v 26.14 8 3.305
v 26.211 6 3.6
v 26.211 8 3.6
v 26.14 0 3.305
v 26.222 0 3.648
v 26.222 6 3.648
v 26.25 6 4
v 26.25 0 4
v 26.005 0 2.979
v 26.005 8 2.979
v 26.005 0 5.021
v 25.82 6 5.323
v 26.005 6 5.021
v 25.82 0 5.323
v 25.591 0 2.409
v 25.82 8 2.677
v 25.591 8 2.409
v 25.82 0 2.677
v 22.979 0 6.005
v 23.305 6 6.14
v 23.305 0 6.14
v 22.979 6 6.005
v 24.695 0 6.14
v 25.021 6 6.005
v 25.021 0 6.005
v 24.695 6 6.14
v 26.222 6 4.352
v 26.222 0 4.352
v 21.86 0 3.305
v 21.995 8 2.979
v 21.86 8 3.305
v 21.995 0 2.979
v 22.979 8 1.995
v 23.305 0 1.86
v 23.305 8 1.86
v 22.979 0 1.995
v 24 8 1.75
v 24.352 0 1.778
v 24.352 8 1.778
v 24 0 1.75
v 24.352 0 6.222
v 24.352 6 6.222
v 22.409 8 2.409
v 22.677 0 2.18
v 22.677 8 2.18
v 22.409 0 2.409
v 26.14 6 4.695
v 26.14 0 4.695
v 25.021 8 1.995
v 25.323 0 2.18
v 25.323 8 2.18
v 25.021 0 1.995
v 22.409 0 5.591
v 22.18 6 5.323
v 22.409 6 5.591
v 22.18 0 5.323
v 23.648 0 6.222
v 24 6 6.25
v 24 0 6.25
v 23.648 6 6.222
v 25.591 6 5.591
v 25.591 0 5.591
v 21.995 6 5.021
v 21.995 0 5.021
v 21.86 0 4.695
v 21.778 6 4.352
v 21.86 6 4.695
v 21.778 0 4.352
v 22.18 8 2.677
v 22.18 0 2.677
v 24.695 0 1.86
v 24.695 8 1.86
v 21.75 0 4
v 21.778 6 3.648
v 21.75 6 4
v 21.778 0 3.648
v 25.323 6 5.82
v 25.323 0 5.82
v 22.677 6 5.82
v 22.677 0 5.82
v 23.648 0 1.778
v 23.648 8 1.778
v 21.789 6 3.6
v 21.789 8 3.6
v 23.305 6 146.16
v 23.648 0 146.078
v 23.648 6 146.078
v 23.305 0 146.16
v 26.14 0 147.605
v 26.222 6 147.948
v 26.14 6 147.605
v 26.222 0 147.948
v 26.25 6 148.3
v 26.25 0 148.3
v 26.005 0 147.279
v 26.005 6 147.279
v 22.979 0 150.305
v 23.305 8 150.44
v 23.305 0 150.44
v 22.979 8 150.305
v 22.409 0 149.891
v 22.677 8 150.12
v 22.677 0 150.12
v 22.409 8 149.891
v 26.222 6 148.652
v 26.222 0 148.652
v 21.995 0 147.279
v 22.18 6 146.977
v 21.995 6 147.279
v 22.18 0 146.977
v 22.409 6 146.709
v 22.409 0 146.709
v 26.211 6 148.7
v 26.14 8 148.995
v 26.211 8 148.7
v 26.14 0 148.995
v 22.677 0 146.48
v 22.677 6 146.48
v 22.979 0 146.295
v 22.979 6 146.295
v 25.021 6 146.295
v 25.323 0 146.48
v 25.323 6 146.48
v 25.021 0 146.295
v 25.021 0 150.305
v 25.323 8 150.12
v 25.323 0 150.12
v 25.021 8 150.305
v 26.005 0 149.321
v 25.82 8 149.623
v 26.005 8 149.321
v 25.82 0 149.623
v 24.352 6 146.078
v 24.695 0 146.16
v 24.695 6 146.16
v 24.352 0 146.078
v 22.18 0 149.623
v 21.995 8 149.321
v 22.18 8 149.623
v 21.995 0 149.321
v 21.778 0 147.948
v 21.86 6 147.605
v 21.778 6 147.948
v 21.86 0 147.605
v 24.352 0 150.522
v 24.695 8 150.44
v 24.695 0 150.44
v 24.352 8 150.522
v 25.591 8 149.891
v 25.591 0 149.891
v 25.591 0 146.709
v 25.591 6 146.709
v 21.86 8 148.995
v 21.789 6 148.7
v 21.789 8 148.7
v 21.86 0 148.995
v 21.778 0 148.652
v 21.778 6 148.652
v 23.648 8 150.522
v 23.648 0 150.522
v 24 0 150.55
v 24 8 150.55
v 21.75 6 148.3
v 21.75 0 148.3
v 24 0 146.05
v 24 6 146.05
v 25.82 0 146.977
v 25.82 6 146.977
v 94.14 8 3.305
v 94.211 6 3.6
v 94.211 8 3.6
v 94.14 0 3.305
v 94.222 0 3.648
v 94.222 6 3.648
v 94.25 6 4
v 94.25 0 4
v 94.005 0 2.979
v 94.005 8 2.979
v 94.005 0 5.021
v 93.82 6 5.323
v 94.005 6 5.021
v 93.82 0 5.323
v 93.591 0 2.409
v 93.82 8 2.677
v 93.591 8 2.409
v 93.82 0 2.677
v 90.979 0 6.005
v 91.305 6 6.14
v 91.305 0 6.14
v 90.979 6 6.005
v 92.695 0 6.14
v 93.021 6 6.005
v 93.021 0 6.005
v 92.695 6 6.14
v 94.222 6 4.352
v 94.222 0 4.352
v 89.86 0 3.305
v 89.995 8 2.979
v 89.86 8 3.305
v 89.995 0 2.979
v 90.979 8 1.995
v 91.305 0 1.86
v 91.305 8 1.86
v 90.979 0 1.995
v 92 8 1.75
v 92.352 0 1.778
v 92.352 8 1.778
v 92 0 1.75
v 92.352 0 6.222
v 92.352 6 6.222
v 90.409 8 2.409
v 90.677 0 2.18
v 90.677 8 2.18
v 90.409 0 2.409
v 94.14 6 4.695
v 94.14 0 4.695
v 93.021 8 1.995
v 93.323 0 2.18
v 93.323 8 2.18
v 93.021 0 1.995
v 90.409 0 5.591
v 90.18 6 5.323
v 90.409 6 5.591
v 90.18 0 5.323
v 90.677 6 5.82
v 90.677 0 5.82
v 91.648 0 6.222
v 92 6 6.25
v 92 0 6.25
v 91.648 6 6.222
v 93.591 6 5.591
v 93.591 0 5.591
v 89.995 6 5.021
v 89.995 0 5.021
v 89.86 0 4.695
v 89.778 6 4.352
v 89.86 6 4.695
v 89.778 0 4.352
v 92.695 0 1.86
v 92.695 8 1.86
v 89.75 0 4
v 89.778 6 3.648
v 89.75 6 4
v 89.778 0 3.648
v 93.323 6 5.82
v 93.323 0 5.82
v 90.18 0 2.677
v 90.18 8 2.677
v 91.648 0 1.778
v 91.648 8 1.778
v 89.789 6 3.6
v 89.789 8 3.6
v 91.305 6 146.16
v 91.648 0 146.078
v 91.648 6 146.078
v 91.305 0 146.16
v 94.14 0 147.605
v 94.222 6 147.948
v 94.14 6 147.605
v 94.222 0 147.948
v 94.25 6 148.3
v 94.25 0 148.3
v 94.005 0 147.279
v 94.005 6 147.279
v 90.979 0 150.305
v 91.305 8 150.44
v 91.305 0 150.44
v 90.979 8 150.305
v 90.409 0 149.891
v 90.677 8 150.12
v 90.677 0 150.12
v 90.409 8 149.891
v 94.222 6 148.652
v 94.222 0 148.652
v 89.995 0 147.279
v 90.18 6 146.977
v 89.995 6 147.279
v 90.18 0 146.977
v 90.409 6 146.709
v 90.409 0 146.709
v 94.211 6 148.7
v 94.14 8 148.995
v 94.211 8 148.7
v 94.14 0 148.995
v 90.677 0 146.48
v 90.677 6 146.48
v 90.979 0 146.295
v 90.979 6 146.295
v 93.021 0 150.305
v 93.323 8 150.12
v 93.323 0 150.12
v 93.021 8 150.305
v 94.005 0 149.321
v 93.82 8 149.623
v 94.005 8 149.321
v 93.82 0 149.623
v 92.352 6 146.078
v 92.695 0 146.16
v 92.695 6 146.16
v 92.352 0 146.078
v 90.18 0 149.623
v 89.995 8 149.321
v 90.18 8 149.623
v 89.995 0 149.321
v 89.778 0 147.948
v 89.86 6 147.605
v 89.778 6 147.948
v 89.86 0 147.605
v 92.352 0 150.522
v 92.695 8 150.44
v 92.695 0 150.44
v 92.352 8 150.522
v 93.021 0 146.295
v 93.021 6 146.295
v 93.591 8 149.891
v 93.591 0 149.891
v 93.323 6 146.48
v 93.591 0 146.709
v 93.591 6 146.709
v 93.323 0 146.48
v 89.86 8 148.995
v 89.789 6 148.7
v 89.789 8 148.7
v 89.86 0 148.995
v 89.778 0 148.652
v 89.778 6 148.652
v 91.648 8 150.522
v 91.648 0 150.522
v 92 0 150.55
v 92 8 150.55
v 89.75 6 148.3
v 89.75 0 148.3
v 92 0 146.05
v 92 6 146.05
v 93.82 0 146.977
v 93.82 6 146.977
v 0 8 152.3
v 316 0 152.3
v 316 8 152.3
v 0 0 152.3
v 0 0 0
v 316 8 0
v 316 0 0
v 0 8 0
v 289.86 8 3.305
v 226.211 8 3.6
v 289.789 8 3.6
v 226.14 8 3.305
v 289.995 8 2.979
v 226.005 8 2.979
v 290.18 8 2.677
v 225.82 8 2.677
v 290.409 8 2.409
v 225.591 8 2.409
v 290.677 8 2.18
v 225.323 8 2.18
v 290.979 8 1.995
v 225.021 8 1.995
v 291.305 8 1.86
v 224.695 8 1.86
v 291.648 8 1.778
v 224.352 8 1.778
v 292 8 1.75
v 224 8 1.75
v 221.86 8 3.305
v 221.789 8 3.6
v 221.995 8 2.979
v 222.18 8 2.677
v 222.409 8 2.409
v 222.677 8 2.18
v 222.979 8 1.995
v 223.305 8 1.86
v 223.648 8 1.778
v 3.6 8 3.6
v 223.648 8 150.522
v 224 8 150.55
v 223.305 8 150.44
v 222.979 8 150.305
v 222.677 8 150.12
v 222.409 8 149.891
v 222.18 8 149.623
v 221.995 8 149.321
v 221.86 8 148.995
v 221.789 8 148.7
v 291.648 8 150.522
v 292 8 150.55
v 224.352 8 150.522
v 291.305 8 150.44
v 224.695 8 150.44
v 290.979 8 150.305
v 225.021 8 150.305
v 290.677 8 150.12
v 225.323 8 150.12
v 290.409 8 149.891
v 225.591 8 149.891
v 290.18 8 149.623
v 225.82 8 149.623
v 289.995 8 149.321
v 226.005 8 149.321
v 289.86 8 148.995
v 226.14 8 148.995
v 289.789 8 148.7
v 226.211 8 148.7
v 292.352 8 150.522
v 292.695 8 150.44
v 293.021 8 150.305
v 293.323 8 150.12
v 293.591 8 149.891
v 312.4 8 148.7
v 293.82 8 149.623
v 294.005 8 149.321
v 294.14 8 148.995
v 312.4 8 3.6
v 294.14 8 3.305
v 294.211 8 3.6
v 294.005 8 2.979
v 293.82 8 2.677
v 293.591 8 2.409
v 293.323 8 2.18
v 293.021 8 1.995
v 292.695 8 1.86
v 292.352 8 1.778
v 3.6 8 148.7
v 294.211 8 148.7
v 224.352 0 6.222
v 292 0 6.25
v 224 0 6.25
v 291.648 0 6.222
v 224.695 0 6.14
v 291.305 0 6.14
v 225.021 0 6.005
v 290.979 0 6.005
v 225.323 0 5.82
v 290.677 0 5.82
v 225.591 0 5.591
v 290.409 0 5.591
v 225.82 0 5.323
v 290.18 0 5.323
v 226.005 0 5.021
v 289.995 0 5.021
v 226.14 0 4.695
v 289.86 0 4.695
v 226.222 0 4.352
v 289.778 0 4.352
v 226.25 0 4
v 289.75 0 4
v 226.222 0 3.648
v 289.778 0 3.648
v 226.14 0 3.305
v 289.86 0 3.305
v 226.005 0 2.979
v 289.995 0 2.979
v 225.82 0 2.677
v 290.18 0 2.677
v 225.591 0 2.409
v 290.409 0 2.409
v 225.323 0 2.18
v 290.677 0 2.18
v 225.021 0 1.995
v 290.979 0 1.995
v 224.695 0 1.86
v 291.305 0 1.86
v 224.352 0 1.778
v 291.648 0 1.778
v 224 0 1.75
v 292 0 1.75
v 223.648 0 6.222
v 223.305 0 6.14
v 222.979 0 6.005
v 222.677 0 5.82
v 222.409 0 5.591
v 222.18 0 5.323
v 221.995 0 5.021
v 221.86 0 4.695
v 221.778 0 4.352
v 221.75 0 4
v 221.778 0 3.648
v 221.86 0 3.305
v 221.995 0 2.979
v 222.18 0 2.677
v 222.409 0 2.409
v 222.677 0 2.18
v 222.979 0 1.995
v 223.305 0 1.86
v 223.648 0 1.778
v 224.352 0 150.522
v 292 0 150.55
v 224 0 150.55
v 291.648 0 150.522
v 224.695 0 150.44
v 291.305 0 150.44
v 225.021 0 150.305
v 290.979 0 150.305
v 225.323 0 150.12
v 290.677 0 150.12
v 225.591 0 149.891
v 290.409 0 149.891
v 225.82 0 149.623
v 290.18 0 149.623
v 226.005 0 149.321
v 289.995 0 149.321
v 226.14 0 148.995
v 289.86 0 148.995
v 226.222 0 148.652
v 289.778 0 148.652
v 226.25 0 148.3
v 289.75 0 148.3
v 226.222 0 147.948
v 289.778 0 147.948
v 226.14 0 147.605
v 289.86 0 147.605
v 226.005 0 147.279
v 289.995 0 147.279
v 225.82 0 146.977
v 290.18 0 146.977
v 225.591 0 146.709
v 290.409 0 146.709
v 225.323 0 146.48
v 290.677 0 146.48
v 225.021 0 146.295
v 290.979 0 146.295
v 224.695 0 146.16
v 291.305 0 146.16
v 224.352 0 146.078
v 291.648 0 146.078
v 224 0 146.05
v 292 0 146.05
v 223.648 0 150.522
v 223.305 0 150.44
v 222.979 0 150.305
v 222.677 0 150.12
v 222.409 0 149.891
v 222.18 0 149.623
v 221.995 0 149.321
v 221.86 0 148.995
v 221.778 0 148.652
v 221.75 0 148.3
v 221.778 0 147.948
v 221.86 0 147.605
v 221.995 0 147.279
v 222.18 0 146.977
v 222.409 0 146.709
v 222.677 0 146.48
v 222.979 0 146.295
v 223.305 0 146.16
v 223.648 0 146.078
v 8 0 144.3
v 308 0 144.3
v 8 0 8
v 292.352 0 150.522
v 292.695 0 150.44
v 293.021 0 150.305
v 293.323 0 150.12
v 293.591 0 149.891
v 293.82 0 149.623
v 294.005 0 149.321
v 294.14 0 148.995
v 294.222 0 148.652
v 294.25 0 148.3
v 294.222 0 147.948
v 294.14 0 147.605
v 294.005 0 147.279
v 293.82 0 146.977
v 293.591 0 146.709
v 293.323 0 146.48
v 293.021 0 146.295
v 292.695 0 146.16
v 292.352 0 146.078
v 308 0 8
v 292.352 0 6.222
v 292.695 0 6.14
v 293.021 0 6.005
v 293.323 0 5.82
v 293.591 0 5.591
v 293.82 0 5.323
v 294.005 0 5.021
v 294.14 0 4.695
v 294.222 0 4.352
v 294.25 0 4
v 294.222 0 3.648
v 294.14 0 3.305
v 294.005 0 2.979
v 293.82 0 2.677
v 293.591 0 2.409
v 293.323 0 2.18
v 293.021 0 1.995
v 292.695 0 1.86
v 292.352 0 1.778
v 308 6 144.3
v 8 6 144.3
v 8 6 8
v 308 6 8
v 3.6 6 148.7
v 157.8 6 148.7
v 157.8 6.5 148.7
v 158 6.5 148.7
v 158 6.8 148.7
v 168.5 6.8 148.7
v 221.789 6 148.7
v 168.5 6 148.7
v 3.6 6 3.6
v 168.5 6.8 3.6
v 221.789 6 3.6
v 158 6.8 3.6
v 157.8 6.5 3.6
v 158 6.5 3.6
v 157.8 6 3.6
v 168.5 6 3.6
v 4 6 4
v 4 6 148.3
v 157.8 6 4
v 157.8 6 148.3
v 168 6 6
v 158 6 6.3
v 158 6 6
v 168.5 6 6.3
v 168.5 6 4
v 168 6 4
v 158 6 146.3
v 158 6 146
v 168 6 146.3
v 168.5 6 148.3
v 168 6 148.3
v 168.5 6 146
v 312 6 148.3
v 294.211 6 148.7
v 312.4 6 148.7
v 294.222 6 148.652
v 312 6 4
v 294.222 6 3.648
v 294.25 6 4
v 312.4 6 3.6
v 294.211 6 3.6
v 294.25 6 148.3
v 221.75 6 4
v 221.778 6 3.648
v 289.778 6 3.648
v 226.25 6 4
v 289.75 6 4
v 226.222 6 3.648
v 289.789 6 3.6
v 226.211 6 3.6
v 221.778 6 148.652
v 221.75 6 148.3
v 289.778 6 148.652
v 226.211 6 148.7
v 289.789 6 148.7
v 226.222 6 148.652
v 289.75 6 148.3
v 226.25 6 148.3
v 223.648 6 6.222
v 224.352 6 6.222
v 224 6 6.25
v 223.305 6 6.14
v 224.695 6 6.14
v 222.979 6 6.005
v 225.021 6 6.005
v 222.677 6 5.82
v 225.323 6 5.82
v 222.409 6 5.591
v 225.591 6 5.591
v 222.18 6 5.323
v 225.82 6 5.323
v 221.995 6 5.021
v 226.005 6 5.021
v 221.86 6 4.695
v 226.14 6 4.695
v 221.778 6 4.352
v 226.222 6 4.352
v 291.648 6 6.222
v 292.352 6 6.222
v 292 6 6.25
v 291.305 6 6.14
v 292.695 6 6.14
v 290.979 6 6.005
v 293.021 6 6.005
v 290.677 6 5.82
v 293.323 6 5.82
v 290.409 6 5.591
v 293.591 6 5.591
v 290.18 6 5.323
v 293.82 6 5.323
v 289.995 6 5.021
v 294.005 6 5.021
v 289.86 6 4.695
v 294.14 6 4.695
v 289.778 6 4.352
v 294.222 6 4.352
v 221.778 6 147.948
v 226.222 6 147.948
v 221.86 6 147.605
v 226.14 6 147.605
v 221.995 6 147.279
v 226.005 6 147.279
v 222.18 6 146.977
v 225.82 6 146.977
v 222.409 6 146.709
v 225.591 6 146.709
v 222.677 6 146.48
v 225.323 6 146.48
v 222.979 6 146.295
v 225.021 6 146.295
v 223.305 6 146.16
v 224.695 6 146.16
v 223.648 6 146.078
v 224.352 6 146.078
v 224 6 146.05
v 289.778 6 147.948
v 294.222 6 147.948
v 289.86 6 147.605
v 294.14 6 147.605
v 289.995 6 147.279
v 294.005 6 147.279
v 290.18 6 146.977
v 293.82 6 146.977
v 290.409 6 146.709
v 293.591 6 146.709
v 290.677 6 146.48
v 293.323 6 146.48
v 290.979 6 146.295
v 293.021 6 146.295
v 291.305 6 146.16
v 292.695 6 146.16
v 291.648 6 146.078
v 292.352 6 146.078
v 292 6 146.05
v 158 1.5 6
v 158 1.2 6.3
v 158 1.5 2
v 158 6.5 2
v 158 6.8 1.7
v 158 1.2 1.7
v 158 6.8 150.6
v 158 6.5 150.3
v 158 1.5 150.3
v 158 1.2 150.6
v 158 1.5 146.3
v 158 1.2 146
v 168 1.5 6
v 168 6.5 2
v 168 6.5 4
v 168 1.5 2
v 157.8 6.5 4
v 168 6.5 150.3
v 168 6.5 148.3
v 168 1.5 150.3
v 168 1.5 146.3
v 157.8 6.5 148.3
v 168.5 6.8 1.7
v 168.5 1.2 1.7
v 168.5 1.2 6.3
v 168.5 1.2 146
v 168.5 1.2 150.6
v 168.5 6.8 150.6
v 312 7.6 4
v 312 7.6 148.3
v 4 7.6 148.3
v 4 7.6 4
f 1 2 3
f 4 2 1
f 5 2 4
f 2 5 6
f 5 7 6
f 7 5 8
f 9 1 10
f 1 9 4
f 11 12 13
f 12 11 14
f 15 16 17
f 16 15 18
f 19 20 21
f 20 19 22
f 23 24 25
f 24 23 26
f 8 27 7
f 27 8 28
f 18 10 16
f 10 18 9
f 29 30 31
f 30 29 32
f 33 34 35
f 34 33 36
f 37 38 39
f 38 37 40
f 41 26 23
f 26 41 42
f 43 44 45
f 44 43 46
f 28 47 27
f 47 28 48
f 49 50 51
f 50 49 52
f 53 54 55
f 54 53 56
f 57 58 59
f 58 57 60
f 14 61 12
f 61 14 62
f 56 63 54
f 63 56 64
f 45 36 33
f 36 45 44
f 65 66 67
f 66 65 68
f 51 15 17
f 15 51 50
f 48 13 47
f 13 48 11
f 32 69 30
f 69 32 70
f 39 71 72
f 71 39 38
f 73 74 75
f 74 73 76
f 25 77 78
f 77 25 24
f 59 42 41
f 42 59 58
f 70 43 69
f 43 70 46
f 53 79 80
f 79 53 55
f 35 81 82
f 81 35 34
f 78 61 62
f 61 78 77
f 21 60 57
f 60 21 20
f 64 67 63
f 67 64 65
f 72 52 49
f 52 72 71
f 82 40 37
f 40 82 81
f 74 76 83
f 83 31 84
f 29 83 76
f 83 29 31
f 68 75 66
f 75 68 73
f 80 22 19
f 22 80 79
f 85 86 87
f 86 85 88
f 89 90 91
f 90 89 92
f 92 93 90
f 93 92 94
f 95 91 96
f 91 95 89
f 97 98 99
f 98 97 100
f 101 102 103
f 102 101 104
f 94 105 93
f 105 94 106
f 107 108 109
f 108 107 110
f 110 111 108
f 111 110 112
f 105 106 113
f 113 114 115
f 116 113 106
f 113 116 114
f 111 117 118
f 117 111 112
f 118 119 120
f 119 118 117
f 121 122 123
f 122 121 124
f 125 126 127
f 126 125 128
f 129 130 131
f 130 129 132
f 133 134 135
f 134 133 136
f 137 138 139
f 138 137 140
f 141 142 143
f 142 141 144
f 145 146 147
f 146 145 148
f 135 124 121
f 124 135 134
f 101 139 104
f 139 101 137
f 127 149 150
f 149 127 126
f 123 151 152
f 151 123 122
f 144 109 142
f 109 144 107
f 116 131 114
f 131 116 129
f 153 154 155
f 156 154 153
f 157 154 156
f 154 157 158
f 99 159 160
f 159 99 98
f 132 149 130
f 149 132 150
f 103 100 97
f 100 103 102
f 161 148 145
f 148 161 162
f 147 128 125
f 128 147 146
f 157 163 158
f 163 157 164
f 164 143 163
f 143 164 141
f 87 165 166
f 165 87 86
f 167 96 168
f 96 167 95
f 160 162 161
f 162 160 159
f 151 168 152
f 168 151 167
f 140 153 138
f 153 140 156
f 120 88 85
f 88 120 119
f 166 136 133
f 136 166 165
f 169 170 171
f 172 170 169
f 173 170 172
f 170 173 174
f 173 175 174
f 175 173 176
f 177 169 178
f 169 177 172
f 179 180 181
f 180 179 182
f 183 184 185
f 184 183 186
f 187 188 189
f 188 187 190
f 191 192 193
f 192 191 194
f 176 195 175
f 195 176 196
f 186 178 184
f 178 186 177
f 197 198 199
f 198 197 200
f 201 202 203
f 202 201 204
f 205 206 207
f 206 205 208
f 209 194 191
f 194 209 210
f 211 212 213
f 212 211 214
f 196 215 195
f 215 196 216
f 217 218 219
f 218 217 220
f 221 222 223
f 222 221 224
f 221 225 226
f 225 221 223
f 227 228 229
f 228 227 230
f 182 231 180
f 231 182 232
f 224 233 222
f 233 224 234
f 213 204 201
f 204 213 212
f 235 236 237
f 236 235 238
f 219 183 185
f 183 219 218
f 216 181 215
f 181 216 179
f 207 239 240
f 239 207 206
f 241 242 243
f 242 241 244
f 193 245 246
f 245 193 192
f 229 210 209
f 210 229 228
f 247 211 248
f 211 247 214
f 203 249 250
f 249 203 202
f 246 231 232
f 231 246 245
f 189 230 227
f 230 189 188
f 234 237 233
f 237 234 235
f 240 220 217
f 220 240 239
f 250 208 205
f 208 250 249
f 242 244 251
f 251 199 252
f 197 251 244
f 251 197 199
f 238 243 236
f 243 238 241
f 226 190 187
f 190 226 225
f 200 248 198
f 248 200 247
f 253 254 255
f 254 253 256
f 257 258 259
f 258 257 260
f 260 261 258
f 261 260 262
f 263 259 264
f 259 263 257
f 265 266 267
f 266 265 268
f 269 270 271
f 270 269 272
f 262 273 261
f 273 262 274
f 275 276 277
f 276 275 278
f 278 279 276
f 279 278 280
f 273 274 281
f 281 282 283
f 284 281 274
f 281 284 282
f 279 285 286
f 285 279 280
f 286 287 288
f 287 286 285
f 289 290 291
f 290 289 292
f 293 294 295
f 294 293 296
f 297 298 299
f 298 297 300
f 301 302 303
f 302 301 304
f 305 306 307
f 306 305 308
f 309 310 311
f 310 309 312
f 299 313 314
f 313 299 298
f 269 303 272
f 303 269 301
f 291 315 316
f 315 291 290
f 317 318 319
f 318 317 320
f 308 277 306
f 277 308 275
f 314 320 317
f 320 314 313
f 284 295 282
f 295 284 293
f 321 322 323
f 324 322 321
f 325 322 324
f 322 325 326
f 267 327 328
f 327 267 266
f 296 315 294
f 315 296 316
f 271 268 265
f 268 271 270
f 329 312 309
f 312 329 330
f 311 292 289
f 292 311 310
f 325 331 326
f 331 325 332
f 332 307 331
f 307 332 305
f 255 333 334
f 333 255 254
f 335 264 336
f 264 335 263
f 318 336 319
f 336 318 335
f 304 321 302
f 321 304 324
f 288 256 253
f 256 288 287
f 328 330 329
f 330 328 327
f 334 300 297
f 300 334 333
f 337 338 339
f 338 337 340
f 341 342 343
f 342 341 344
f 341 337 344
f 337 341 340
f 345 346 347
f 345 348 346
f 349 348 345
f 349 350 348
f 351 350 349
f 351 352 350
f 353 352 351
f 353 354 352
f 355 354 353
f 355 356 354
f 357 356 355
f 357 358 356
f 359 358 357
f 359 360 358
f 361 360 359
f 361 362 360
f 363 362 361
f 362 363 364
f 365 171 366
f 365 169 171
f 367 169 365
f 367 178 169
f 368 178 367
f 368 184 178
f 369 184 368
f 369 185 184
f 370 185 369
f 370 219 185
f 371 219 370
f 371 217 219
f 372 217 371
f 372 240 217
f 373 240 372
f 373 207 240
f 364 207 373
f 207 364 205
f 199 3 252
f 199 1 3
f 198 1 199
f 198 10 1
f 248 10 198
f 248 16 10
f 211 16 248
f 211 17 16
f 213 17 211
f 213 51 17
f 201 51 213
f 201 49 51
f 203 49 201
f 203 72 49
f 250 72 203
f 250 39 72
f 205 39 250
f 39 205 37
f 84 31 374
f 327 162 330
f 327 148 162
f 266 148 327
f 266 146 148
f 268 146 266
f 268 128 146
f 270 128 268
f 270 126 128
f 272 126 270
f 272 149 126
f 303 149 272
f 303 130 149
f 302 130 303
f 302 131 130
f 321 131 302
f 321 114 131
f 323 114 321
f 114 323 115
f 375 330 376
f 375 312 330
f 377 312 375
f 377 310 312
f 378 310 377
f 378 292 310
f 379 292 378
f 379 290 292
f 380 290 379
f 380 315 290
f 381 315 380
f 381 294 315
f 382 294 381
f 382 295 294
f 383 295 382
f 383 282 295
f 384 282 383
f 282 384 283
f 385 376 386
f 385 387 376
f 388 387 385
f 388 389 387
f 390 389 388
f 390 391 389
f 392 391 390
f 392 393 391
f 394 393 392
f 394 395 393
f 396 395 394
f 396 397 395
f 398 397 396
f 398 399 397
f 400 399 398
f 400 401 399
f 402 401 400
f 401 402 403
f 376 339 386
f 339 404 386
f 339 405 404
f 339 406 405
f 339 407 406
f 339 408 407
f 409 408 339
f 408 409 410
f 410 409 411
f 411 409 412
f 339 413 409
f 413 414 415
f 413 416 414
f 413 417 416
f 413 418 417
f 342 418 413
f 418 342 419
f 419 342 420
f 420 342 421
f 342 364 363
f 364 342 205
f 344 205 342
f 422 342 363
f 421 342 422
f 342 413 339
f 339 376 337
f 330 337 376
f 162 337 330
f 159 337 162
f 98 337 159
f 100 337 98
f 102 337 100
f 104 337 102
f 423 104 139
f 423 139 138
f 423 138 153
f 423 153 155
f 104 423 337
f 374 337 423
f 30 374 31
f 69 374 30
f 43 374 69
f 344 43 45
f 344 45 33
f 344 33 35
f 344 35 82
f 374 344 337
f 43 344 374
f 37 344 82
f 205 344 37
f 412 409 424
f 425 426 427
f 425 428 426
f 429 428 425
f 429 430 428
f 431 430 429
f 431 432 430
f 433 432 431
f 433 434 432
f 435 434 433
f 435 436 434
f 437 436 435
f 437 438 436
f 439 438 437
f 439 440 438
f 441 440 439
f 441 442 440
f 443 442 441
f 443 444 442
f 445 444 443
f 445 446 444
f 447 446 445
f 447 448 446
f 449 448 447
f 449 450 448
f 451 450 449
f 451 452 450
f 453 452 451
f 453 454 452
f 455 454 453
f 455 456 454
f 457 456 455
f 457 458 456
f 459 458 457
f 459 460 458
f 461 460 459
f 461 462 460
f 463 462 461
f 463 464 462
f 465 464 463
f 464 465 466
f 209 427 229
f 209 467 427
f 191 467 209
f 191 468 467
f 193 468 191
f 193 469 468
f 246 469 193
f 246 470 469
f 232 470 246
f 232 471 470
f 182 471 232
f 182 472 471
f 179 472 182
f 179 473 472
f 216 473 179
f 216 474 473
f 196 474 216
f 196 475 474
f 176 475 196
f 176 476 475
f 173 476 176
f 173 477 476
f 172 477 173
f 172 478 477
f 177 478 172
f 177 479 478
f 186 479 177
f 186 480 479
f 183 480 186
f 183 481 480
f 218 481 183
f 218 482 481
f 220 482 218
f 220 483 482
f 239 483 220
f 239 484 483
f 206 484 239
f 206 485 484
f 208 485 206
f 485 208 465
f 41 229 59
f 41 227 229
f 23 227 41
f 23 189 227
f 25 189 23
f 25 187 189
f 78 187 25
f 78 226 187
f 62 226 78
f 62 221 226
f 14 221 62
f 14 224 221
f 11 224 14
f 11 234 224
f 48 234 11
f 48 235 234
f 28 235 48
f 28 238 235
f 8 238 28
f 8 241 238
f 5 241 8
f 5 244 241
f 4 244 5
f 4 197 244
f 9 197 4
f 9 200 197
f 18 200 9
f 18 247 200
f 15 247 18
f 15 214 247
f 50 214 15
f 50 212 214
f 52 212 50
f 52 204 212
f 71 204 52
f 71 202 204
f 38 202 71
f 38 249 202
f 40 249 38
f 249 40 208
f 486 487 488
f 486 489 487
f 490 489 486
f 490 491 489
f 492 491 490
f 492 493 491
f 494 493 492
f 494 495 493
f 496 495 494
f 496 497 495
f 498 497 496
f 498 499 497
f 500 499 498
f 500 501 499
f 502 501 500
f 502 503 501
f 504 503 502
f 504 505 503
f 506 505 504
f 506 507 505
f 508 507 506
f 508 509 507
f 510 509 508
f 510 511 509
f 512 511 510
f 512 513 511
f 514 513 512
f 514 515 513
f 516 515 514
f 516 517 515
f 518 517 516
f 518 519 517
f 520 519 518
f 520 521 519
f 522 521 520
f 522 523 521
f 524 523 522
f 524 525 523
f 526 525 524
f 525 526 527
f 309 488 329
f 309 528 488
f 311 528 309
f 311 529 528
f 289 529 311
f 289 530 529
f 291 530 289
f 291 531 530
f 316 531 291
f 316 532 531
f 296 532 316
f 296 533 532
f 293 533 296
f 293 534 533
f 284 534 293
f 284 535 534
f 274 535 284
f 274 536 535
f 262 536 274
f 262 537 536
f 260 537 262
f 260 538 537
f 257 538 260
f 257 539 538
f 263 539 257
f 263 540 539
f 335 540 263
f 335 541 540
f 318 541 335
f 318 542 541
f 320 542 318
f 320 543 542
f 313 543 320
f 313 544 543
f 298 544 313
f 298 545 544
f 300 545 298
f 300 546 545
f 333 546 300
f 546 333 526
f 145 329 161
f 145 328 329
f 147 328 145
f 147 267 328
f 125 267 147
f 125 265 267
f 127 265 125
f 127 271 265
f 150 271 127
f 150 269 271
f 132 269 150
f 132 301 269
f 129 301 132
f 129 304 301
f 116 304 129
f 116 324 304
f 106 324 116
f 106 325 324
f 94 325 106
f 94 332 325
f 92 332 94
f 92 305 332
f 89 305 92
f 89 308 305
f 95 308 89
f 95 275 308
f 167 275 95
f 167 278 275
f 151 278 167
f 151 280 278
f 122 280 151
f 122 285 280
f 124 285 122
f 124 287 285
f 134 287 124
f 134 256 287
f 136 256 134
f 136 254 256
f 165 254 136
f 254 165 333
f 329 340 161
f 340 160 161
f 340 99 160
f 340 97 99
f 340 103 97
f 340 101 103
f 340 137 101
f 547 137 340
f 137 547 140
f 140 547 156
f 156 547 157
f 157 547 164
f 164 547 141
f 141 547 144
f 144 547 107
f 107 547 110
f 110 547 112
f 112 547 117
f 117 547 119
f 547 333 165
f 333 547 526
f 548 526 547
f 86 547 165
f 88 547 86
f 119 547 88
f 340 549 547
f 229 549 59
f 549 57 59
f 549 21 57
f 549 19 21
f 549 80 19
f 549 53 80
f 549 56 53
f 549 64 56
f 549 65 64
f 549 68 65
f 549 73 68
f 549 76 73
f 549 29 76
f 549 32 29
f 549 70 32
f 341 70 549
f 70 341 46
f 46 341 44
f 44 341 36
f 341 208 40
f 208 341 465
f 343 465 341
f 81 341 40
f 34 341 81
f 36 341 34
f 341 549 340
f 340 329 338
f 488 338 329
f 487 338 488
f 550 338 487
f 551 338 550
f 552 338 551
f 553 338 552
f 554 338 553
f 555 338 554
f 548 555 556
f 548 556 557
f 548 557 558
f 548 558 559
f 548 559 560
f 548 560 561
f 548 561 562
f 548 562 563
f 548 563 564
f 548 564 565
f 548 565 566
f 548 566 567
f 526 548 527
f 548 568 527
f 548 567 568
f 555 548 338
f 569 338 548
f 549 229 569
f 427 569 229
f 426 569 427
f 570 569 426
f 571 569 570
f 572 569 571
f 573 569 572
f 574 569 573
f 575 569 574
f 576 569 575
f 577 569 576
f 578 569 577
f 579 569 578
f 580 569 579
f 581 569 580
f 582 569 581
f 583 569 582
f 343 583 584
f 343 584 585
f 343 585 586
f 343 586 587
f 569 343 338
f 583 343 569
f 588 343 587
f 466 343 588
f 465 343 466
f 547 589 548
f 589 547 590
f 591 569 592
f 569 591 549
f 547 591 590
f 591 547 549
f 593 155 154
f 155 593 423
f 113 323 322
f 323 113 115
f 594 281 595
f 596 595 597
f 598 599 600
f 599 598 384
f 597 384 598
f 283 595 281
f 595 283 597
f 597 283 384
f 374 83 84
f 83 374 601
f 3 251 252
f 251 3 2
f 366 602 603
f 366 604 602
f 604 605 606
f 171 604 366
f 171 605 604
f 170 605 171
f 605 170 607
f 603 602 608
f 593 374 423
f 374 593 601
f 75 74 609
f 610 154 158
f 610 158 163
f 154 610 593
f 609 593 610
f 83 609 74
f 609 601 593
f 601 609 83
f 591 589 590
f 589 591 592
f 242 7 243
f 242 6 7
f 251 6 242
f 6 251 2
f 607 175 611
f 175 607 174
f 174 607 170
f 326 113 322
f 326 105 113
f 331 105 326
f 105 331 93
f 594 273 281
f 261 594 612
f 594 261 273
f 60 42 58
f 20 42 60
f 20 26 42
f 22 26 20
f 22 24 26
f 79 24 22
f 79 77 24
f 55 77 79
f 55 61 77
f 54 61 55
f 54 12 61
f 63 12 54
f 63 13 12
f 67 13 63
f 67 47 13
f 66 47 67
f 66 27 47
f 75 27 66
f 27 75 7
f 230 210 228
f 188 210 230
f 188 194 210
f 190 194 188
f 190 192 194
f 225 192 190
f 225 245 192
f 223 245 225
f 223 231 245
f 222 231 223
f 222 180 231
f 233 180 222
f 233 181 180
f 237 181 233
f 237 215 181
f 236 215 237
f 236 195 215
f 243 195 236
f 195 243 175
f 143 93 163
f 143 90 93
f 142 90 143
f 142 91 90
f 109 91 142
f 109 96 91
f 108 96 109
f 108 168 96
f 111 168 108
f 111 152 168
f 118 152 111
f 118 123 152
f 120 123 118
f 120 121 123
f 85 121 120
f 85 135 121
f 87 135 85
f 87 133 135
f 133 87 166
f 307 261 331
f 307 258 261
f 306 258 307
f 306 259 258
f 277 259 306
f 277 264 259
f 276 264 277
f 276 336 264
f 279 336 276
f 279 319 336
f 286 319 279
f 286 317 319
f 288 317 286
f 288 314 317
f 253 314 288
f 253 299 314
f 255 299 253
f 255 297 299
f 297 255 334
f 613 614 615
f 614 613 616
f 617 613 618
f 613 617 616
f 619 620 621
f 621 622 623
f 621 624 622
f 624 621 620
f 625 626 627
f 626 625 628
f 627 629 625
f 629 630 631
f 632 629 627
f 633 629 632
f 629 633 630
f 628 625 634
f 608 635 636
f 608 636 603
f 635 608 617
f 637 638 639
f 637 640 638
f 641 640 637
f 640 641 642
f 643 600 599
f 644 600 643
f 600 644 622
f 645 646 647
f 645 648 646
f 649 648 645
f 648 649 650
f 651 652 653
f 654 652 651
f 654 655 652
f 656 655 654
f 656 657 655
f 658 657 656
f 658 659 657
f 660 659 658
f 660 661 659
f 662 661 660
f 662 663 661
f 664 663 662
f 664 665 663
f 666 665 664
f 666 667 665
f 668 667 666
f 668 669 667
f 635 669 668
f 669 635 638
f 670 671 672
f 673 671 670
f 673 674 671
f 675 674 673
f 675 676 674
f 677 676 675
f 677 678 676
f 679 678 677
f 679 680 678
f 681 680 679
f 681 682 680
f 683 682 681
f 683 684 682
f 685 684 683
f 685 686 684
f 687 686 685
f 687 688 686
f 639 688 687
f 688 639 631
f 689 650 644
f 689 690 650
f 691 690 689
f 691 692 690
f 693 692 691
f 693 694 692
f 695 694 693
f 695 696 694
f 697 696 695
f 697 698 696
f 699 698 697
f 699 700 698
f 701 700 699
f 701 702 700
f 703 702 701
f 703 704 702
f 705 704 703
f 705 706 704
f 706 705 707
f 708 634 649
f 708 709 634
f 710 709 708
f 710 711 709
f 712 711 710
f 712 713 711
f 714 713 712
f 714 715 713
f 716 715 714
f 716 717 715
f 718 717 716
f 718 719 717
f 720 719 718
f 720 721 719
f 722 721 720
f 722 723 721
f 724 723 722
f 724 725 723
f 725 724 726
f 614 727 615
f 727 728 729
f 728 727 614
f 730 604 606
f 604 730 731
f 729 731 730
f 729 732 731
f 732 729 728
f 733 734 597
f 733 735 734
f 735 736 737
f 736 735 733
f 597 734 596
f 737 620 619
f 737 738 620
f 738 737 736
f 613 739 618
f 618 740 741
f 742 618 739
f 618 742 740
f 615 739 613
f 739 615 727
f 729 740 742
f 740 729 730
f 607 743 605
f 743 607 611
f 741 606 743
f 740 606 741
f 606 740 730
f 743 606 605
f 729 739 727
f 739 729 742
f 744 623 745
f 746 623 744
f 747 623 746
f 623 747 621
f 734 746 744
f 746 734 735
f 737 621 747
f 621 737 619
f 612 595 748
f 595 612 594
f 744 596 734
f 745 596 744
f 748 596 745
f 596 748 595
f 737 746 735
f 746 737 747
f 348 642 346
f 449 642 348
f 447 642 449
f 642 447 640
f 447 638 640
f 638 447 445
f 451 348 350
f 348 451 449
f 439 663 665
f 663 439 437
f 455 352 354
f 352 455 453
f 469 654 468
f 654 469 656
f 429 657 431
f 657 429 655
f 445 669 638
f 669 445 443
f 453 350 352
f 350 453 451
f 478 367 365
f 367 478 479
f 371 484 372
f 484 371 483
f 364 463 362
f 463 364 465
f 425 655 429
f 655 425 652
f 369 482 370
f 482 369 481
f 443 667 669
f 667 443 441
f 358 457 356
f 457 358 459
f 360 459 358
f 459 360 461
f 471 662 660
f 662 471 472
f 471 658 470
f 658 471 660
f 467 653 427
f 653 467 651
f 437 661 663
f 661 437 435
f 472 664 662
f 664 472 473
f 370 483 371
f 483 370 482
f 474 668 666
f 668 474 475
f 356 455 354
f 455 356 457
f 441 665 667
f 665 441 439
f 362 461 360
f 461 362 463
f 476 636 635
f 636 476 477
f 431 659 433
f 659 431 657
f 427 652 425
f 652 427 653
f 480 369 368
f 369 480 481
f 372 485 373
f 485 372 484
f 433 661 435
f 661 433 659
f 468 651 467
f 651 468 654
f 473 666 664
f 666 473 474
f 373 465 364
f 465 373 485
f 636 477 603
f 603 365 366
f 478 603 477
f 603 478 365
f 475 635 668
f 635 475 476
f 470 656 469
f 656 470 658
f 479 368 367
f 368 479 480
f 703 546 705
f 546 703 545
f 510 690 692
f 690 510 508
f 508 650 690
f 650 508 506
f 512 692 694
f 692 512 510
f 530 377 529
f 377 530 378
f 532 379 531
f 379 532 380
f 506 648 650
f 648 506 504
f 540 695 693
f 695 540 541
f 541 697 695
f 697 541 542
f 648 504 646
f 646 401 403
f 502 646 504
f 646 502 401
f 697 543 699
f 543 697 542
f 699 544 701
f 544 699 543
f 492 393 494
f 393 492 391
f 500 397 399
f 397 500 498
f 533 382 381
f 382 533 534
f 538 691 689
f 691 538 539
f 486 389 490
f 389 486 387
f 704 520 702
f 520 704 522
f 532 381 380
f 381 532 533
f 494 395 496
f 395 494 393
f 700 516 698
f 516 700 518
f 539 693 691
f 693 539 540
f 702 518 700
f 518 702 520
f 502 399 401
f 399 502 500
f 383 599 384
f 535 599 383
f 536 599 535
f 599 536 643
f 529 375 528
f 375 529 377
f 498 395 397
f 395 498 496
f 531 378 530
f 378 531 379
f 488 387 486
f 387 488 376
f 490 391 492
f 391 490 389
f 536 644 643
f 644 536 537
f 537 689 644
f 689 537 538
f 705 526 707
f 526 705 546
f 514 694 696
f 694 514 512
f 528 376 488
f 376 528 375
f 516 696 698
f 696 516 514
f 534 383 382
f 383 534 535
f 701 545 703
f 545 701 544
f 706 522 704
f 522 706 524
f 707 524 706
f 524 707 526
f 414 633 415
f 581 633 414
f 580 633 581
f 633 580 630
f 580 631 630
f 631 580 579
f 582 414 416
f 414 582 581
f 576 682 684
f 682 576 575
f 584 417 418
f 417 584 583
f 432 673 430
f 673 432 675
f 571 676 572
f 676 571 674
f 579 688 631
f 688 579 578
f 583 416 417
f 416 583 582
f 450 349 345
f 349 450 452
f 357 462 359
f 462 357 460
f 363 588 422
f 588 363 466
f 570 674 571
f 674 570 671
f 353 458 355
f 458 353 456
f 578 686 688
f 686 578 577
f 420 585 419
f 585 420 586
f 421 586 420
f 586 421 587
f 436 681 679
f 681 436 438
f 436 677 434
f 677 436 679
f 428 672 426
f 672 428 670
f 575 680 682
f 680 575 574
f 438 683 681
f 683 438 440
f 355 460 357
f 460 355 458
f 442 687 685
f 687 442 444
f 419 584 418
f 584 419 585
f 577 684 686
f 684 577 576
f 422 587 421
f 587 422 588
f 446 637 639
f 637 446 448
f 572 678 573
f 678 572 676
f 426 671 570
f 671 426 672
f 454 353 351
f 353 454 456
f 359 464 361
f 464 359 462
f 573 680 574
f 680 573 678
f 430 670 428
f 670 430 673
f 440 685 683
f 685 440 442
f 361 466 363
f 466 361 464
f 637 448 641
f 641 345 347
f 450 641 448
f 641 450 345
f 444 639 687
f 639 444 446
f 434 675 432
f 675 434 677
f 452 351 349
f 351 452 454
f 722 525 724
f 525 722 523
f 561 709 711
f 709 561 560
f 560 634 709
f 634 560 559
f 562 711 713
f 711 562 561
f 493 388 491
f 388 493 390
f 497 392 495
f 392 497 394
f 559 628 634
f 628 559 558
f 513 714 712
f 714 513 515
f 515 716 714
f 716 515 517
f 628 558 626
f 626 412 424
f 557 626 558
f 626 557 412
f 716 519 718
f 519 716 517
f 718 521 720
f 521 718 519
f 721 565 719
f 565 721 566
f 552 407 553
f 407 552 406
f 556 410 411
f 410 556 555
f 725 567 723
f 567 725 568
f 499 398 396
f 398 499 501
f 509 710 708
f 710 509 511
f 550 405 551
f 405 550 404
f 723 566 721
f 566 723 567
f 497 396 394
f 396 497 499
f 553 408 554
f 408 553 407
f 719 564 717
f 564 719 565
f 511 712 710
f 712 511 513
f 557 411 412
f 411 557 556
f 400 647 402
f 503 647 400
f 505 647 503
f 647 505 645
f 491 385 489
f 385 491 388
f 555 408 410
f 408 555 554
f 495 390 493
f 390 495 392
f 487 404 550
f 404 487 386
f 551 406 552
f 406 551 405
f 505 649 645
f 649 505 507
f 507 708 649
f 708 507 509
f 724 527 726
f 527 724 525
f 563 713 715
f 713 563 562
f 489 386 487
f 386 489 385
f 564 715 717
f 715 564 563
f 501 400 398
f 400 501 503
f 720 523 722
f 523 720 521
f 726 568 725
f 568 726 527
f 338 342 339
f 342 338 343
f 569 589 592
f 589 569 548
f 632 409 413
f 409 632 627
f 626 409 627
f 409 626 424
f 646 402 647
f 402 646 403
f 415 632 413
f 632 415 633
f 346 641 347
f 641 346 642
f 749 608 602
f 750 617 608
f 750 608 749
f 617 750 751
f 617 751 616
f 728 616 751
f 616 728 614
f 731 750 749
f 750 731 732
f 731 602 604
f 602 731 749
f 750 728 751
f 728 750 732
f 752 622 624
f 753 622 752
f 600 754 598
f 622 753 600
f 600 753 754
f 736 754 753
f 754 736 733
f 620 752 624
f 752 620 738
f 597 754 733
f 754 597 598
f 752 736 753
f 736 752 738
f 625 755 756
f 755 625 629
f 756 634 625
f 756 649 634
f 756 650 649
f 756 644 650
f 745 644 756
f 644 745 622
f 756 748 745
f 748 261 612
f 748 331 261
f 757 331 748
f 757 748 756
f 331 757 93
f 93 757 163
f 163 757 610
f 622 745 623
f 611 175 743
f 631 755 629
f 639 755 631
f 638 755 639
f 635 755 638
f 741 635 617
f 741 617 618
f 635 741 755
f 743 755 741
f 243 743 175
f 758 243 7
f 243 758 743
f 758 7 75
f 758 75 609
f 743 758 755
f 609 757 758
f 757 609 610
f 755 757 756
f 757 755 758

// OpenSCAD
// BC-250 vertical board spine v0.1
// Independent geometry based on the factual bare-PCB envelope and open-licensed
// adapter checks. No restricted third-party mesh is imported or redistributed.

$fn = 40;

part = "assembly"; // front | rear | assembly
show_board = true;
assembly_gap = 0;

board = [308.0, 1.6, 144.3]; // X length, Y thickness, Z height
board_clearance = 0.40;
frame_margin = 4;
frame_depth = 8;
frame_rail = 8;
frame = [board[0] + 2 * frame_margin, frame_depth,
         board[2] + 2 * frame_margin];

split_x = frame[0] / 2;
tongue_length = 10;
tongue_clearance = 0.30;
tongue_height = 4;

board_pocket_depth = 2.0;
board_pocket = [board[0] + 2 * board_clearance,
                board[1] + board_clearance,
                board[2] + 2 * board_clearance];

shell_mount_x = [24, 92, frame[0] - 92, frame[0] - 24];
shell_mount_z = [frame_rail / 2, frame[2] - frame_rail / 2];
m4_clearance_d = 4.5;

module y_hole(x, z, diameter, length) {
    translate([x, -0.1, z])
        rotate([-90, 0, 0]) cylinder(h = length + 0.2, d = diameter);
}

module complete_spine() {
    difference() {
        cube(frame);

        // Open centre preserves backplate access and rear-component airflow.
        translate([frame_rail, -0.1, frame_rail])
            cube([frame[0] - 2 * frame_rail, frame_depth + 0.2,
                  frame[2] - 2 * frame_rail]);

        // The board nests 2 mm into the front face. The remaining 6 mm is the
        // structural rail and future heat-set-insert depth.
        translate([
            frame_margin - board_clearance,
            frame_depth - board_pocket_depth,
            frame_margin - board_clearance
        ])
            cube([board_pocket[0], board_pocket_depth + 0.1,
                  board_pocket[2]]);

        // Eight transverse chassis points remain accessible with the PCB fitted.
        for (x = shell_mount_x, z = shell_mount_z)
            y_hole(x, z, m4_clearance_d, frame_depth);
    }
}

module spine_slice(x0, length) {
    intersection() {
        complete_spine();
        translate([x0, -1, -1]) cube([length, frame_depth + 2, frame[2] + 2]);
    }
}

module front_spine() {
    union() {
        spine_slice(0, split_x);
        for (z = [2, frame[2] - 2 - tongue_height])
            translate([split_x - 0.2, 1.5, z])
                cube([tongue_length + 0.2, frame_depth - 3, tongue_height]);
    }
}

module rear_spine() {
    difference() {
        spine_slice(split_x, frame[0] - split_x);
        for (z = [2 - tongue_clearance,
                  frame[2] - 2 - tongue_height - tongue_clearance])
            translate([split_x - 0.3, 1.5 - tongue_clearance, z])
                cube([tongue_length + tongue_clearance + 0.5,
                      frame_depth - 3 + 2 * tongue_clearance,
                      tongue_height + 2 * tongue_clearance]);
    }
}

module board_proxy() {
    color([0.10, 0.48, 0.29, 0.42])
        translate([frame_margin, frame_depth - board_pocket_depth,
                   frame_margin])
            cube(board);
}

if (part == "front")
    front_spine();
else if (part == "rear")
    translate([-split_x, 0, 0]) rear_spine();
else {
    color([0.16, 0.17, 0.20]) front_spine();
    color([0.22, 0.23, 0.27]) translate([assembly_gap, 0, 0]) rear_spine();
    if (show_board && assembly_gap == 0) board_proxy();
}

echo("part", part);
echo("bare PCB XxZxY mm", [board[0], board[2], board[1]]);
echo("spine print envelope mm", [split_x + tongue_length, frame[2], frame_depth]);
echo("board pocket clearance each edge mm", board_clearance);
echo("chassis M4 axes X/Z mm", [shell_mount_x, shell_mount_z]);
echo("retention status", "edge clamps not frozen; requires physical keepout check");

assert(split_x + tongue_length <= 220, "Front spine exceeds 220 mm print-bed target");
assert(frame[2] <= 220, "Spine height exceeds 220 mm print-bed target");
assert(board_pocket_depth >= board[1], "Board pocket is shallower than PCB");
